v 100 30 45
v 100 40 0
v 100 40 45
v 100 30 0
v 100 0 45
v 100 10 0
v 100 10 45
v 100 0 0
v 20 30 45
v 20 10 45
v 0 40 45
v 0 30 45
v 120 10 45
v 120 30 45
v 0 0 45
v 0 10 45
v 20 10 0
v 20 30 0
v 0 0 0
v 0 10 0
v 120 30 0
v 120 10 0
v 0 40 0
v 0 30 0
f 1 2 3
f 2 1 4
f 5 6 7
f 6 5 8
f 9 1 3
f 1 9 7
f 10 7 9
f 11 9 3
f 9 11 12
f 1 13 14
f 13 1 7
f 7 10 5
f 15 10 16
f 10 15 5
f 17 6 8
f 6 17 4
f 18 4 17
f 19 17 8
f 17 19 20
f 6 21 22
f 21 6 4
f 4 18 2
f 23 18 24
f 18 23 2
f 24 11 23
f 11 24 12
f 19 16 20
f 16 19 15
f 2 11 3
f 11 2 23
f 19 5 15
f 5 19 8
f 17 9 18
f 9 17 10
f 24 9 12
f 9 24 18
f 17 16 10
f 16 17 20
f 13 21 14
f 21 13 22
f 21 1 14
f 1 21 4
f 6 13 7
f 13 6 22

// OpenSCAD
LenX=100;
WidthY=40;
HightZ=45;
Buff=5;
DB=Buff*2;
FeetDia=20;
YSpace=(WidthY-FeetDia)/2;

difference()
{
  cube([LenX,WidthY,HightZ]);
  translate([-Buff,YSpace,-Buff]) cube([FeetDia+Buff,FeetDia,HightZ+DB]);
}
translate([LenX,YSpace,0]) cube([FeetDia,FeetDia,HightZ]);
